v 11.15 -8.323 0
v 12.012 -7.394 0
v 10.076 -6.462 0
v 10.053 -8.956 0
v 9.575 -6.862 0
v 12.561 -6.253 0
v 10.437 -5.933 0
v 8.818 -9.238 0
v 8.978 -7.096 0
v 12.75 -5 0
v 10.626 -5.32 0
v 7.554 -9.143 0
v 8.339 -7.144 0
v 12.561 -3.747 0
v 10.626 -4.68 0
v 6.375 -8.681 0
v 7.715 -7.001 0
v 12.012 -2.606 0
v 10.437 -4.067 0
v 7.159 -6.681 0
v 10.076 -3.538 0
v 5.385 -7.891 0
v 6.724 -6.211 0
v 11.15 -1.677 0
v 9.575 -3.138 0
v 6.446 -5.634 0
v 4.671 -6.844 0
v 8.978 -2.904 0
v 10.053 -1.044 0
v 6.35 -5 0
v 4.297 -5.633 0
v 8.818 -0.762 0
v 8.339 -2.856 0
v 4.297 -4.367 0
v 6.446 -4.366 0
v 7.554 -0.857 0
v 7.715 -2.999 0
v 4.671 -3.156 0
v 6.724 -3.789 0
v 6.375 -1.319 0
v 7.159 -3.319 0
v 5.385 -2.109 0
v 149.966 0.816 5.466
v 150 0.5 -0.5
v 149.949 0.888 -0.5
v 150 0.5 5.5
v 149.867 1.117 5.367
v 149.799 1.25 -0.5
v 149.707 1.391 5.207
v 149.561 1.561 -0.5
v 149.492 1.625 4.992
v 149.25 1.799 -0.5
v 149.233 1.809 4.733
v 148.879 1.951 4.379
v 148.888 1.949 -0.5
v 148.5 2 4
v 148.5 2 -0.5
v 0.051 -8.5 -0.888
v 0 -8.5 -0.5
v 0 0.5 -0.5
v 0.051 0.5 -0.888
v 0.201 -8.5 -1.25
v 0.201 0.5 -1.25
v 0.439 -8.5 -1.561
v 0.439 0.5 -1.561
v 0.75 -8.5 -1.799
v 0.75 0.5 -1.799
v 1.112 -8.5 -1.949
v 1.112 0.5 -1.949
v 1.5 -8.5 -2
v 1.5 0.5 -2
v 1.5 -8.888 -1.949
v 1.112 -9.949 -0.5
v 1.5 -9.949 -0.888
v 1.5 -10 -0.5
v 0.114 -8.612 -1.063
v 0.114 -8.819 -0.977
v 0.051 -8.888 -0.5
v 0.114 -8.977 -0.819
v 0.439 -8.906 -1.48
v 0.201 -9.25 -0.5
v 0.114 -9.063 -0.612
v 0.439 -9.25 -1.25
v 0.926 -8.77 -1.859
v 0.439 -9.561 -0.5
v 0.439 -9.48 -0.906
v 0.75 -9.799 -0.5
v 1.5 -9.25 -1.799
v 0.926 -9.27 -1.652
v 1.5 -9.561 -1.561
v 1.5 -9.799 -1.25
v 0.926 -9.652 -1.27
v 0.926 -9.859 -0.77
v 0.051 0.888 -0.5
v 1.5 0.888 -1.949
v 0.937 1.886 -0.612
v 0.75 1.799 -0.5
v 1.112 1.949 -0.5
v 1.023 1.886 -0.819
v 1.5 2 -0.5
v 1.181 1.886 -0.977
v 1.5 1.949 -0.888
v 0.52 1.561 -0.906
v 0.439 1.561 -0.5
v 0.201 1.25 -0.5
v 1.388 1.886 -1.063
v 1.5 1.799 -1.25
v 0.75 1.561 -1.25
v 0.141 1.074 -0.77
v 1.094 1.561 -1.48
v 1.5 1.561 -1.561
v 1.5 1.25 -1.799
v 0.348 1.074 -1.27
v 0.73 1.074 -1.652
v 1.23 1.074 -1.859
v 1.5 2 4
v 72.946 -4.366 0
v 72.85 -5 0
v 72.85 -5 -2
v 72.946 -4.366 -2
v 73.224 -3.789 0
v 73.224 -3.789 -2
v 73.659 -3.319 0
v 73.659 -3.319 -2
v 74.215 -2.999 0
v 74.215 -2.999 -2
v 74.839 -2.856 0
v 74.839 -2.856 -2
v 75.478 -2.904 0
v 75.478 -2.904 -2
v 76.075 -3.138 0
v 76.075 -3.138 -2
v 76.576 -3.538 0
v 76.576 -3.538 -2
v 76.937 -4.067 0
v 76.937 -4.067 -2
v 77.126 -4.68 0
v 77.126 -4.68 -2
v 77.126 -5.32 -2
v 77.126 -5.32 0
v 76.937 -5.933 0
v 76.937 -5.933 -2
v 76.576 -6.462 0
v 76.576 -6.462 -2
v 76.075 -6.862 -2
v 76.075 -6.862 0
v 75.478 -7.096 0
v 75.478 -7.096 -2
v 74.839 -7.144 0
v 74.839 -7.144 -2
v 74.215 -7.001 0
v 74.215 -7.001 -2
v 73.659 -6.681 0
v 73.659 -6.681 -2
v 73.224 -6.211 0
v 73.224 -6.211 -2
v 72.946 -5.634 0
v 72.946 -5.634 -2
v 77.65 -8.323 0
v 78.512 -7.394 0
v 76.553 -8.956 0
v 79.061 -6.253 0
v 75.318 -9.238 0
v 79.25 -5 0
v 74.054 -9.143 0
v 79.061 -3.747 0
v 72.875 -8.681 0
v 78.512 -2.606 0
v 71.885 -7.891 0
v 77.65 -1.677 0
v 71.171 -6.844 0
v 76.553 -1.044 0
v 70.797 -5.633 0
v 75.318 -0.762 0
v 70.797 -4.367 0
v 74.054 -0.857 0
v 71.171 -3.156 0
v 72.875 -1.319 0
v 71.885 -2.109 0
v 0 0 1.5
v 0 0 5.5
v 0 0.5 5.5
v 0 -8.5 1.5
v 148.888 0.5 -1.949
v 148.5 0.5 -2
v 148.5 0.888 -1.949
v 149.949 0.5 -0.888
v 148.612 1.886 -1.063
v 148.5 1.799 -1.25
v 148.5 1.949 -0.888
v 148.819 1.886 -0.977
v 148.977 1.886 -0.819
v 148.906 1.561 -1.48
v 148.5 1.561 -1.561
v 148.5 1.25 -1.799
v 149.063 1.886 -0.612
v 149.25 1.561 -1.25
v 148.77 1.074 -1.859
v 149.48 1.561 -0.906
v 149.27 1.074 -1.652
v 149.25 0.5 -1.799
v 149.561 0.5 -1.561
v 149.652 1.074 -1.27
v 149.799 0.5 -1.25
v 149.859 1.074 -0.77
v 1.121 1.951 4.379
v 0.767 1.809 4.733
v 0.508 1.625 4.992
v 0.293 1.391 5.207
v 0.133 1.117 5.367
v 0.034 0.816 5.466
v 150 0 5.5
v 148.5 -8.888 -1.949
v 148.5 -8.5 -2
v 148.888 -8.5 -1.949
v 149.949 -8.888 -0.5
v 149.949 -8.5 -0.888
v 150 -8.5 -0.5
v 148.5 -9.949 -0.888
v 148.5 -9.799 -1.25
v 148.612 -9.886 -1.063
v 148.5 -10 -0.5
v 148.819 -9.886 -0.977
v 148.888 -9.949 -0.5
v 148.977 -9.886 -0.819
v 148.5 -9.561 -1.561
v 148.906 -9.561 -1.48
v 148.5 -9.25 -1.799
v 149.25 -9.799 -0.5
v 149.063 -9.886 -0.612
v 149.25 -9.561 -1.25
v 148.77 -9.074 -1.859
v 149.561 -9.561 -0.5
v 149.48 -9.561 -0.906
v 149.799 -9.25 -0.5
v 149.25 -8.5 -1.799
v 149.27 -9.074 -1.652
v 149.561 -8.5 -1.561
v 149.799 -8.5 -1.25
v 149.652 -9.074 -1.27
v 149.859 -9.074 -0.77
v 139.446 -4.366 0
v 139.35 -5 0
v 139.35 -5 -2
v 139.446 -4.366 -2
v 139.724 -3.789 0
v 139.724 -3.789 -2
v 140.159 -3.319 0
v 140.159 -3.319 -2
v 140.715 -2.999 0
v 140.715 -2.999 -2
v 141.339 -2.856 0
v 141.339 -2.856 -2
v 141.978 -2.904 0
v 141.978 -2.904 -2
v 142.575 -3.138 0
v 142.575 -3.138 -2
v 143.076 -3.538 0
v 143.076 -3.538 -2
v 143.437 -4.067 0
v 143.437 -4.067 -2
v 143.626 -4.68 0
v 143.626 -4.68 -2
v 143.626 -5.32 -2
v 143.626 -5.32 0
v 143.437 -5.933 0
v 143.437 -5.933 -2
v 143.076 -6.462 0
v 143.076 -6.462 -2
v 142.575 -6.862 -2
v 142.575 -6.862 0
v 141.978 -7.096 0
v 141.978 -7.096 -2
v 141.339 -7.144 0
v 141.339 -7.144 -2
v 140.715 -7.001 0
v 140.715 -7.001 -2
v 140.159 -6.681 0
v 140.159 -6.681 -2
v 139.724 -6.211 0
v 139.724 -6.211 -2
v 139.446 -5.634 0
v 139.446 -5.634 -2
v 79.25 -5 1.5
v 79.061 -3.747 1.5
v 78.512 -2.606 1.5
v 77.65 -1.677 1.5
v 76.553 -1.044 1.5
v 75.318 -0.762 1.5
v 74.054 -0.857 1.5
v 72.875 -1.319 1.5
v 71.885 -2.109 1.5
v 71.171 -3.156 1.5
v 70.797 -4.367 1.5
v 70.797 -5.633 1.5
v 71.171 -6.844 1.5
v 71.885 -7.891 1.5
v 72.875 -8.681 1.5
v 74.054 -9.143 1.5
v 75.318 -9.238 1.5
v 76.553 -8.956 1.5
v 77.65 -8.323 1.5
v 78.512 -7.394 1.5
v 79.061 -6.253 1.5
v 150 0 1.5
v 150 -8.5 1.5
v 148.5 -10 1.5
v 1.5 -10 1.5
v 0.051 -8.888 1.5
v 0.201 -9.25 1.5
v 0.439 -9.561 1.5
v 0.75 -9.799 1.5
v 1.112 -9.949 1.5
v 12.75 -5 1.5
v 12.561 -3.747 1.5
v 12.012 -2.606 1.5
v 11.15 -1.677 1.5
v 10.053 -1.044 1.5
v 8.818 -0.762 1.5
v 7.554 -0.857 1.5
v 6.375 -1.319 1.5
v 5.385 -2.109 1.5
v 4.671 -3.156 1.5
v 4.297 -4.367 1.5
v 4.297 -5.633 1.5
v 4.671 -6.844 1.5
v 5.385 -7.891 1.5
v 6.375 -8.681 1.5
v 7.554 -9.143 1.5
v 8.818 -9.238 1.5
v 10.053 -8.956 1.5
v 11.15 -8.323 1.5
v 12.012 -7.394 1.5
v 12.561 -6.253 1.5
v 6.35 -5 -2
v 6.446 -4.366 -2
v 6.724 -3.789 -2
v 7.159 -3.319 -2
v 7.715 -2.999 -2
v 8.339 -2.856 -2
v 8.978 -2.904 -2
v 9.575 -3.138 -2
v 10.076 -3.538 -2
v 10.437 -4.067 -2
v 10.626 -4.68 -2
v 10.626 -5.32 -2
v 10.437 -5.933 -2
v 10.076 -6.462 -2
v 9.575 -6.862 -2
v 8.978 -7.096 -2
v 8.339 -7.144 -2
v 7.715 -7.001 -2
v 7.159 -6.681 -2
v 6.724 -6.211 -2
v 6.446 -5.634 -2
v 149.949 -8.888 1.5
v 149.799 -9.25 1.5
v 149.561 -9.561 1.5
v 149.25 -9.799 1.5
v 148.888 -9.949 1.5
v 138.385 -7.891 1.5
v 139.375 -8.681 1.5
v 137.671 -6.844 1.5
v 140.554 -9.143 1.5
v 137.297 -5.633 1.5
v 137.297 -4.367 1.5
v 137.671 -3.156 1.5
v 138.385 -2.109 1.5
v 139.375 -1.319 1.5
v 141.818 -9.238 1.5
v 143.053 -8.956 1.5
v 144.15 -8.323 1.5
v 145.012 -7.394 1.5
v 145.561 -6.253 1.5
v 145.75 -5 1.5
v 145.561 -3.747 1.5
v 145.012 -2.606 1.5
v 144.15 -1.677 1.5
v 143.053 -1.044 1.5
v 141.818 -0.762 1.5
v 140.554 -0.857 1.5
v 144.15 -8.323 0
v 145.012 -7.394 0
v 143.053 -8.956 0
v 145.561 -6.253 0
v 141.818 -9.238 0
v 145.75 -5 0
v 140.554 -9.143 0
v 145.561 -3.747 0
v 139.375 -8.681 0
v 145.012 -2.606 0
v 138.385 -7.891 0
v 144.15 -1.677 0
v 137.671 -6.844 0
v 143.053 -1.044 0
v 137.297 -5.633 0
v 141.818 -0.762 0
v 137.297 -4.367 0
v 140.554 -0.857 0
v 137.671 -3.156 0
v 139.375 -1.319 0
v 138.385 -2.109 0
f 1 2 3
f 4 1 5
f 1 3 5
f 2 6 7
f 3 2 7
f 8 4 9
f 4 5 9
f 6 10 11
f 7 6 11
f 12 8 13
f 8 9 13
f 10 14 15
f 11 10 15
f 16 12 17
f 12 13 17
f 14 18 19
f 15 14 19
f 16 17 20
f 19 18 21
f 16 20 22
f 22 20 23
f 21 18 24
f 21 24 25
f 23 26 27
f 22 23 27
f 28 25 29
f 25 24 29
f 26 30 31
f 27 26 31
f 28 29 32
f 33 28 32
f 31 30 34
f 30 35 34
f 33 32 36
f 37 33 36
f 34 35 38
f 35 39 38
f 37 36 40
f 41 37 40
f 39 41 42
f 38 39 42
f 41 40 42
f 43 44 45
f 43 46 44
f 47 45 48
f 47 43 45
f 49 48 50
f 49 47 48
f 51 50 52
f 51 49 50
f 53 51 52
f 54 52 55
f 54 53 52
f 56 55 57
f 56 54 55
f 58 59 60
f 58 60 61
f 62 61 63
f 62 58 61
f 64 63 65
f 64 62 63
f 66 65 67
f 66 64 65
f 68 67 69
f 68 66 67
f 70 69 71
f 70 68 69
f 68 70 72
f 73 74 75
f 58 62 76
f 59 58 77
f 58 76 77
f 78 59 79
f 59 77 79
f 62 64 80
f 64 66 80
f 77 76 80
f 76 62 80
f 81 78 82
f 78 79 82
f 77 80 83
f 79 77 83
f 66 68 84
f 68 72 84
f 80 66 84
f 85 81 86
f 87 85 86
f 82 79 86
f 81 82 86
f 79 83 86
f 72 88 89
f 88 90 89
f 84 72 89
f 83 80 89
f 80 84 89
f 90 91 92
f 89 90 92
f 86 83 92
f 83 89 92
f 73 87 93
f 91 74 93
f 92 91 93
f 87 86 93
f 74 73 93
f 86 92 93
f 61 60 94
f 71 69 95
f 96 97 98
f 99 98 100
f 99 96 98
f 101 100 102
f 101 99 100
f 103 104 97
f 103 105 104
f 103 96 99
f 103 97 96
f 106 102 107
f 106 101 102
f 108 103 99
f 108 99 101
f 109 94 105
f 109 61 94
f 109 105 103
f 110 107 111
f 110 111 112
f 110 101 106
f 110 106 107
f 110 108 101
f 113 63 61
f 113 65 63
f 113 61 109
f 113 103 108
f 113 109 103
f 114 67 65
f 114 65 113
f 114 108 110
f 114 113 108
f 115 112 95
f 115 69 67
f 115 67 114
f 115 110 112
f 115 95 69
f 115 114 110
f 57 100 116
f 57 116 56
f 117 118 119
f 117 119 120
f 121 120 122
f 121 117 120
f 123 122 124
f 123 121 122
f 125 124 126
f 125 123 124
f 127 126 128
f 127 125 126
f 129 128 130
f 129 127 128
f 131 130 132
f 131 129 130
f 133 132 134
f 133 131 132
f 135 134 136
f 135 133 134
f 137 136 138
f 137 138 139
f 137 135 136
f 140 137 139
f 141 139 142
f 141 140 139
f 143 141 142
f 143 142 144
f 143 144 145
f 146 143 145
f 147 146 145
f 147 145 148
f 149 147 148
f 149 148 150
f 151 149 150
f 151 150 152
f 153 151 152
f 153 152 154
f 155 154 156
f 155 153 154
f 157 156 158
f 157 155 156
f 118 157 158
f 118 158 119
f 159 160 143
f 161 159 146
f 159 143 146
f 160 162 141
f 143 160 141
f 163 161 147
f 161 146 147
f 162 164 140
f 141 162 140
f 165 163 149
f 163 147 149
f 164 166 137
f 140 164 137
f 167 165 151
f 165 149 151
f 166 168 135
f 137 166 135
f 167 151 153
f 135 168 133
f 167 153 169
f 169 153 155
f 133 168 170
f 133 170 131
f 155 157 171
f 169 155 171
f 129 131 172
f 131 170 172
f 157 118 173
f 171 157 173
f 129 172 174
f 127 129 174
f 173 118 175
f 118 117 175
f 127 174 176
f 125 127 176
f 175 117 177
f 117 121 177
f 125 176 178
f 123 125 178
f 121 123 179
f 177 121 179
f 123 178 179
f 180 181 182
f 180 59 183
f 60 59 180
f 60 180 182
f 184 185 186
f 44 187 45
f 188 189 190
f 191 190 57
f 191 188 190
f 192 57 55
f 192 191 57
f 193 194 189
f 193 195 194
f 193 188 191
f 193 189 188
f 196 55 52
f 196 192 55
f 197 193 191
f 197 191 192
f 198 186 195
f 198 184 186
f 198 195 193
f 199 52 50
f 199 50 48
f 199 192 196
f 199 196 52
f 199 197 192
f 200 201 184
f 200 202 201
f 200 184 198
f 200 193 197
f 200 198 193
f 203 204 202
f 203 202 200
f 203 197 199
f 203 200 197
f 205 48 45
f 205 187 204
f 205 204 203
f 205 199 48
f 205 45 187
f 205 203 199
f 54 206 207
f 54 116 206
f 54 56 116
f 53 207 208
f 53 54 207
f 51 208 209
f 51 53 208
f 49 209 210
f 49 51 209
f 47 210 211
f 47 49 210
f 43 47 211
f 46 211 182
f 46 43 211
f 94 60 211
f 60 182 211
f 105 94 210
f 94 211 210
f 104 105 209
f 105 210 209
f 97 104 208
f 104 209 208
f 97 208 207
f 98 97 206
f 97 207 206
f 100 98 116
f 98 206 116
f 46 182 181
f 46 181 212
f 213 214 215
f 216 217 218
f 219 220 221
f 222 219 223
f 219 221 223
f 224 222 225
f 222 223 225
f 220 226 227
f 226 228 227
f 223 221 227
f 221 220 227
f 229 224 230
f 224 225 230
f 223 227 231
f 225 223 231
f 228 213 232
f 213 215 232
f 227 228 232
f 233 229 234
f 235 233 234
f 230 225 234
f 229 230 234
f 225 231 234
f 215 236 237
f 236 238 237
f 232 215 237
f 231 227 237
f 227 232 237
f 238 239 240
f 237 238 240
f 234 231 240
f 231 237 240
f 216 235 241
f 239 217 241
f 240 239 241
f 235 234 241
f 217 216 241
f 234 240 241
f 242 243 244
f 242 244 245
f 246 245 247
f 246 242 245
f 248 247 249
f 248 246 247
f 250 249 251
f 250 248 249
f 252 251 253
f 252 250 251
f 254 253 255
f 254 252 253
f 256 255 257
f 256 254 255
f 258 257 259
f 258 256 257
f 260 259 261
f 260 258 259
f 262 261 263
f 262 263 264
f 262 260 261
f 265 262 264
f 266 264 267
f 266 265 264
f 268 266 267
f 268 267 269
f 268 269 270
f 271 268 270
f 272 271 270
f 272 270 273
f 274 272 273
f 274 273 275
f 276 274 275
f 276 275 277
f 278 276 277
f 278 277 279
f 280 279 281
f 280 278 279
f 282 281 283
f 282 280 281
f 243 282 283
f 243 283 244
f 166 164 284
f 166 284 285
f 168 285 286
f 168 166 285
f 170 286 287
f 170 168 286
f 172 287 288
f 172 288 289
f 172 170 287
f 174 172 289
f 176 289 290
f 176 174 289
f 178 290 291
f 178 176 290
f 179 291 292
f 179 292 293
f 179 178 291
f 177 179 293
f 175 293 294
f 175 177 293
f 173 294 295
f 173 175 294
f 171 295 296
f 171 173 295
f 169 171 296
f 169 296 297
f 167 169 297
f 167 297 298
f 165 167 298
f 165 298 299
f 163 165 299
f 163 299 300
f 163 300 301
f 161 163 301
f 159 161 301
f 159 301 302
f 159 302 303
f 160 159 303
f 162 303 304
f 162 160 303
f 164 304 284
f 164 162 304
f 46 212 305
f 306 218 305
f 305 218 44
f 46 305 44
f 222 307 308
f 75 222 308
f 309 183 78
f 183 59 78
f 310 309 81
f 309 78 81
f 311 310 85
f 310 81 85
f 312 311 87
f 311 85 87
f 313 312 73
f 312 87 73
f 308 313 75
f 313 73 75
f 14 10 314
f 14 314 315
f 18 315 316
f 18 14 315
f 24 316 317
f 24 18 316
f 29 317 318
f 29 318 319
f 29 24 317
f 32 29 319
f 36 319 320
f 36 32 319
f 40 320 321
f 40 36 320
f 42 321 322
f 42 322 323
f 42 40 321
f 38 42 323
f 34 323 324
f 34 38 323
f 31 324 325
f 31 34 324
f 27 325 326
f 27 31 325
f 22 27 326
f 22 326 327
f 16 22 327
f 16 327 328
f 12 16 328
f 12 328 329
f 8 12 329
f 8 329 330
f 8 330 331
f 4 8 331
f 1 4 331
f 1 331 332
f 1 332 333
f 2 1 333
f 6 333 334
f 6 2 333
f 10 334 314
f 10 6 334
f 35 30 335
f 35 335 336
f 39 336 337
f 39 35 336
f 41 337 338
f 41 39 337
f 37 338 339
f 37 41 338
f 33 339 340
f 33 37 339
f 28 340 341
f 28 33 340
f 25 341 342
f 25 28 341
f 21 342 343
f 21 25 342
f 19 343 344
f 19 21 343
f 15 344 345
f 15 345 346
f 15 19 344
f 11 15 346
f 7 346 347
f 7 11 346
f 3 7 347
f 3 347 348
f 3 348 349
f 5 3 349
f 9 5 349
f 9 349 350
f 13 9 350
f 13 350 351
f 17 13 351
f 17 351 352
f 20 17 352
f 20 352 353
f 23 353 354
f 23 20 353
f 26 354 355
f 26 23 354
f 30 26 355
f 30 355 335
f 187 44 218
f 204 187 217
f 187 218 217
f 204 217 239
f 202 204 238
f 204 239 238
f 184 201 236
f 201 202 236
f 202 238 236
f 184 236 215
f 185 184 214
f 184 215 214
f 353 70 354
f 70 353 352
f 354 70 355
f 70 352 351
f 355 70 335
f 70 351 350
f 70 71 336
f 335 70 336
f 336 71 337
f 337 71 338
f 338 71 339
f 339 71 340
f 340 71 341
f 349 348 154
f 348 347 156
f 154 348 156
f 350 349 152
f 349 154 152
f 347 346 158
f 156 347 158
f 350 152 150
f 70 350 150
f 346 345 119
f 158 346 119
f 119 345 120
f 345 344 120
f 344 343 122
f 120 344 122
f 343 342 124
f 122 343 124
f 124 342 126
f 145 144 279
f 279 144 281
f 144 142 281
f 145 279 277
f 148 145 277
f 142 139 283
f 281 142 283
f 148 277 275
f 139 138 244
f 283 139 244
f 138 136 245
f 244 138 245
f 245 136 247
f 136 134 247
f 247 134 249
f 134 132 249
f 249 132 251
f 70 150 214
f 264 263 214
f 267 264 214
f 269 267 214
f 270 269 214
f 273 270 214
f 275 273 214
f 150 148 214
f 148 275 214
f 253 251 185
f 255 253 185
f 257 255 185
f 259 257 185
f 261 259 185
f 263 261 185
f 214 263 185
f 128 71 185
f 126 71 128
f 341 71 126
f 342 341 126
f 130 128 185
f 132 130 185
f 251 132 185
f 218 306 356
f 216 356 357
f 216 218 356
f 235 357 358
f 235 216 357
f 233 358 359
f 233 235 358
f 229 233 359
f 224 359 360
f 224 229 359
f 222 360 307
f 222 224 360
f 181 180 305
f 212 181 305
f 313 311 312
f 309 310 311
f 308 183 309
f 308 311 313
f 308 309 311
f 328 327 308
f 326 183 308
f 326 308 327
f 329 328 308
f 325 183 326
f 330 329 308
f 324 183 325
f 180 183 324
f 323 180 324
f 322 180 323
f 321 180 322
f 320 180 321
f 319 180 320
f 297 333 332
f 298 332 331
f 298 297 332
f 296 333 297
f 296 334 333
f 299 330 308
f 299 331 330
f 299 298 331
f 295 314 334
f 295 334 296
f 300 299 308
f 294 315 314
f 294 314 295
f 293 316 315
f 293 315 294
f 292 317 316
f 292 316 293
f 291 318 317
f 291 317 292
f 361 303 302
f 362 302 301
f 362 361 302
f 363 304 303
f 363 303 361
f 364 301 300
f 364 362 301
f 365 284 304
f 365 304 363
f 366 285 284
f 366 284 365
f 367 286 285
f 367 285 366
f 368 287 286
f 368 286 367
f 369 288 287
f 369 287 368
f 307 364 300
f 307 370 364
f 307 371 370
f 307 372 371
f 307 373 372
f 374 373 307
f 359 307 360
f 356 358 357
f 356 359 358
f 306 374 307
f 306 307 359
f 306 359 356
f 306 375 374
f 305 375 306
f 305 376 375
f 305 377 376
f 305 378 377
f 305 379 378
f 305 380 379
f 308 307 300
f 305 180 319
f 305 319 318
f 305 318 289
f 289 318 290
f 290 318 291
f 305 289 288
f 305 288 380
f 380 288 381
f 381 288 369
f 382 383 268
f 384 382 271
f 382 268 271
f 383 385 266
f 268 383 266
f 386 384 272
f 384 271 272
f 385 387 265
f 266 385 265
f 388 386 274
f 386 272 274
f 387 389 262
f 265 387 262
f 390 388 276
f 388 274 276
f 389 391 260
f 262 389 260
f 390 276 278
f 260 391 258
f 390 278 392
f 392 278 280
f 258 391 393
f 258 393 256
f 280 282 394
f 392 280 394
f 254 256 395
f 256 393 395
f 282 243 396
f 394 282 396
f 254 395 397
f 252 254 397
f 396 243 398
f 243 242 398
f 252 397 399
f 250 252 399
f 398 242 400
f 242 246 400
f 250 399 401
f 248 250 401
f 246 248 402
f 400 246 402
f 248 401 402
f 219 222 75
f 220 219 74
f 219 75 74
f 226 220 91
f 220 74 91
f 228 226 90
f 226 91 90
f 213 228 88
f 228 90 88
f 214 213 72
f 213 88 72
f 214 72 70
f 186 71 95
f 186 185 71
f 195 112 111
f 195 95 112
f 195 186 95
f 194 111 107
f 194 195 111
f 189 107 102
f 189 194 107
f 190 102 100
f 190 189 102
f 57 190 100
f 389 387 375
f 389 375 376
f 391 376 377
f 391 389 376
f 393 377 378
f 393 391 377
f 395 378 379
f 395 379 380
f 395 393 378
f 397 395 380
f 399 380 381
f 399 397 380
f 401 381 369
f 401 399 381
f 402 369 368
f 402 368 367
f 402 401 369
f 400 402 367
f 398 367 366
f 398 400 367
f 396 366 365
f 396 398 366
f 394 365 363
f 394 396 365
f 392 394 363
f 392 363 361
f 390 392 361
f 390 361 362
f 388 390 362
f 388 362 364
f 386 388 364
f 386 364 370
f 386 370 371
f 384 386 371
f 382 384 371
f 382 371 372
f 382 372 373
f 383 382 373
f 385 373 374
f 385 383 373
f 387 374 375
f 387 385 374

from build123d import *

# Parameters (mm, degrees)
SKETCH1_W                = 150
SKETCH1_H                = 10
SKETCH1_R                = 4.25
BOSS_EXTRUDE1_DEPTH      = 1.5
SKETCH2_W                = 150
SKETCH2_H                = 10
SKETCH2_R                = 2.15
BOSS_EXTRUDE2_DEPTH      = 2
BOSS_EXTRUDE3_DEPTH      = 4
BOSS_EXTRUDE3_DEPTH_BACK = 3.5
SKETCH3_W                = 150
SKETCH3_H                = 2
FILLET1_R                = 1.5


with BuildPart() as part:
    # Sketch1 → Boss-Extrude1 (new body)
    with BuildSketch(Plane.XY):
        with Locations((75, -5)):
            Rectangle(SKETCH1_W, SKETCH1_H)
        with Locations((75, -5)):
            Circle(SKETCH1_R, mode=Mode.SUBTRACT)
        with Locations((141.5, -5)):
            Circle(SKETCH1_R, mode=Mode.SUBTRACT)
        with Locations((8.5, -5)):
            Circle(SKETCH1_R, mode=Mode.SUBTRACT)
    extrude(amount=BOSS_EXTRUDE1_DEPTH)

    # Sketch2 → Boss-Extrude2 (add)
    with BuildSketch(Plane(origin=(0, 0, 0), x_dir=(-1, 0, 0), z_dir=(0, 0, -1))):
        with Locations((-75, -5)):
            Rectangle(SKETCH2_W, SKETCH2_H)
        with Locations((-8.5, -5)):
            Circle(SKETCH2_R, mode=Mode.SUBTRACT)
        with Locations((-75, -5)):
            Circle(SKETCH2_R, mode=Mode.SUBTRACT)
        with Locations((-141.5, -5)):
            Circle(SKETCH2_R, mode=Mode.SUBTRACT)
    extrude(amount=BOSS_EXTRUDE2_DEPTH)

    # Sketch3 → Boss-Extrude3 (add, two sides: drawn at the far end of the back side and taken through both)
    with BuildSketch(Plane.XY.offset(1.5).offset(-BOSS_EXTRUDE3_DEPTH_BACK)):
        with Locations((75, 1)):
            Rectangle(SKETCH3_W, SKETCH3_H)
    extrude(amount=BOSS_EXTRUDE3_DEPTH + BOSS_EXTRUDE3_DEPTH_BACK)

    # Fillet1
    fillet1_edges = [part.edges().sort_by_distance(p)[0] for p in [
        (150, -4, -2),
        (75, -10, -2),
        (0, -4, -2),
        (0, 2, 1.75),
        (75, 2, -2),
        (150, 2, 1.75),
        (75, 2, 5.5),
        (150, -10, -0.25),
        (0, -10, -0.25),
    ]]
    fillet(fillet1_edges, radius=FILLET1_R)


solid = part.part
